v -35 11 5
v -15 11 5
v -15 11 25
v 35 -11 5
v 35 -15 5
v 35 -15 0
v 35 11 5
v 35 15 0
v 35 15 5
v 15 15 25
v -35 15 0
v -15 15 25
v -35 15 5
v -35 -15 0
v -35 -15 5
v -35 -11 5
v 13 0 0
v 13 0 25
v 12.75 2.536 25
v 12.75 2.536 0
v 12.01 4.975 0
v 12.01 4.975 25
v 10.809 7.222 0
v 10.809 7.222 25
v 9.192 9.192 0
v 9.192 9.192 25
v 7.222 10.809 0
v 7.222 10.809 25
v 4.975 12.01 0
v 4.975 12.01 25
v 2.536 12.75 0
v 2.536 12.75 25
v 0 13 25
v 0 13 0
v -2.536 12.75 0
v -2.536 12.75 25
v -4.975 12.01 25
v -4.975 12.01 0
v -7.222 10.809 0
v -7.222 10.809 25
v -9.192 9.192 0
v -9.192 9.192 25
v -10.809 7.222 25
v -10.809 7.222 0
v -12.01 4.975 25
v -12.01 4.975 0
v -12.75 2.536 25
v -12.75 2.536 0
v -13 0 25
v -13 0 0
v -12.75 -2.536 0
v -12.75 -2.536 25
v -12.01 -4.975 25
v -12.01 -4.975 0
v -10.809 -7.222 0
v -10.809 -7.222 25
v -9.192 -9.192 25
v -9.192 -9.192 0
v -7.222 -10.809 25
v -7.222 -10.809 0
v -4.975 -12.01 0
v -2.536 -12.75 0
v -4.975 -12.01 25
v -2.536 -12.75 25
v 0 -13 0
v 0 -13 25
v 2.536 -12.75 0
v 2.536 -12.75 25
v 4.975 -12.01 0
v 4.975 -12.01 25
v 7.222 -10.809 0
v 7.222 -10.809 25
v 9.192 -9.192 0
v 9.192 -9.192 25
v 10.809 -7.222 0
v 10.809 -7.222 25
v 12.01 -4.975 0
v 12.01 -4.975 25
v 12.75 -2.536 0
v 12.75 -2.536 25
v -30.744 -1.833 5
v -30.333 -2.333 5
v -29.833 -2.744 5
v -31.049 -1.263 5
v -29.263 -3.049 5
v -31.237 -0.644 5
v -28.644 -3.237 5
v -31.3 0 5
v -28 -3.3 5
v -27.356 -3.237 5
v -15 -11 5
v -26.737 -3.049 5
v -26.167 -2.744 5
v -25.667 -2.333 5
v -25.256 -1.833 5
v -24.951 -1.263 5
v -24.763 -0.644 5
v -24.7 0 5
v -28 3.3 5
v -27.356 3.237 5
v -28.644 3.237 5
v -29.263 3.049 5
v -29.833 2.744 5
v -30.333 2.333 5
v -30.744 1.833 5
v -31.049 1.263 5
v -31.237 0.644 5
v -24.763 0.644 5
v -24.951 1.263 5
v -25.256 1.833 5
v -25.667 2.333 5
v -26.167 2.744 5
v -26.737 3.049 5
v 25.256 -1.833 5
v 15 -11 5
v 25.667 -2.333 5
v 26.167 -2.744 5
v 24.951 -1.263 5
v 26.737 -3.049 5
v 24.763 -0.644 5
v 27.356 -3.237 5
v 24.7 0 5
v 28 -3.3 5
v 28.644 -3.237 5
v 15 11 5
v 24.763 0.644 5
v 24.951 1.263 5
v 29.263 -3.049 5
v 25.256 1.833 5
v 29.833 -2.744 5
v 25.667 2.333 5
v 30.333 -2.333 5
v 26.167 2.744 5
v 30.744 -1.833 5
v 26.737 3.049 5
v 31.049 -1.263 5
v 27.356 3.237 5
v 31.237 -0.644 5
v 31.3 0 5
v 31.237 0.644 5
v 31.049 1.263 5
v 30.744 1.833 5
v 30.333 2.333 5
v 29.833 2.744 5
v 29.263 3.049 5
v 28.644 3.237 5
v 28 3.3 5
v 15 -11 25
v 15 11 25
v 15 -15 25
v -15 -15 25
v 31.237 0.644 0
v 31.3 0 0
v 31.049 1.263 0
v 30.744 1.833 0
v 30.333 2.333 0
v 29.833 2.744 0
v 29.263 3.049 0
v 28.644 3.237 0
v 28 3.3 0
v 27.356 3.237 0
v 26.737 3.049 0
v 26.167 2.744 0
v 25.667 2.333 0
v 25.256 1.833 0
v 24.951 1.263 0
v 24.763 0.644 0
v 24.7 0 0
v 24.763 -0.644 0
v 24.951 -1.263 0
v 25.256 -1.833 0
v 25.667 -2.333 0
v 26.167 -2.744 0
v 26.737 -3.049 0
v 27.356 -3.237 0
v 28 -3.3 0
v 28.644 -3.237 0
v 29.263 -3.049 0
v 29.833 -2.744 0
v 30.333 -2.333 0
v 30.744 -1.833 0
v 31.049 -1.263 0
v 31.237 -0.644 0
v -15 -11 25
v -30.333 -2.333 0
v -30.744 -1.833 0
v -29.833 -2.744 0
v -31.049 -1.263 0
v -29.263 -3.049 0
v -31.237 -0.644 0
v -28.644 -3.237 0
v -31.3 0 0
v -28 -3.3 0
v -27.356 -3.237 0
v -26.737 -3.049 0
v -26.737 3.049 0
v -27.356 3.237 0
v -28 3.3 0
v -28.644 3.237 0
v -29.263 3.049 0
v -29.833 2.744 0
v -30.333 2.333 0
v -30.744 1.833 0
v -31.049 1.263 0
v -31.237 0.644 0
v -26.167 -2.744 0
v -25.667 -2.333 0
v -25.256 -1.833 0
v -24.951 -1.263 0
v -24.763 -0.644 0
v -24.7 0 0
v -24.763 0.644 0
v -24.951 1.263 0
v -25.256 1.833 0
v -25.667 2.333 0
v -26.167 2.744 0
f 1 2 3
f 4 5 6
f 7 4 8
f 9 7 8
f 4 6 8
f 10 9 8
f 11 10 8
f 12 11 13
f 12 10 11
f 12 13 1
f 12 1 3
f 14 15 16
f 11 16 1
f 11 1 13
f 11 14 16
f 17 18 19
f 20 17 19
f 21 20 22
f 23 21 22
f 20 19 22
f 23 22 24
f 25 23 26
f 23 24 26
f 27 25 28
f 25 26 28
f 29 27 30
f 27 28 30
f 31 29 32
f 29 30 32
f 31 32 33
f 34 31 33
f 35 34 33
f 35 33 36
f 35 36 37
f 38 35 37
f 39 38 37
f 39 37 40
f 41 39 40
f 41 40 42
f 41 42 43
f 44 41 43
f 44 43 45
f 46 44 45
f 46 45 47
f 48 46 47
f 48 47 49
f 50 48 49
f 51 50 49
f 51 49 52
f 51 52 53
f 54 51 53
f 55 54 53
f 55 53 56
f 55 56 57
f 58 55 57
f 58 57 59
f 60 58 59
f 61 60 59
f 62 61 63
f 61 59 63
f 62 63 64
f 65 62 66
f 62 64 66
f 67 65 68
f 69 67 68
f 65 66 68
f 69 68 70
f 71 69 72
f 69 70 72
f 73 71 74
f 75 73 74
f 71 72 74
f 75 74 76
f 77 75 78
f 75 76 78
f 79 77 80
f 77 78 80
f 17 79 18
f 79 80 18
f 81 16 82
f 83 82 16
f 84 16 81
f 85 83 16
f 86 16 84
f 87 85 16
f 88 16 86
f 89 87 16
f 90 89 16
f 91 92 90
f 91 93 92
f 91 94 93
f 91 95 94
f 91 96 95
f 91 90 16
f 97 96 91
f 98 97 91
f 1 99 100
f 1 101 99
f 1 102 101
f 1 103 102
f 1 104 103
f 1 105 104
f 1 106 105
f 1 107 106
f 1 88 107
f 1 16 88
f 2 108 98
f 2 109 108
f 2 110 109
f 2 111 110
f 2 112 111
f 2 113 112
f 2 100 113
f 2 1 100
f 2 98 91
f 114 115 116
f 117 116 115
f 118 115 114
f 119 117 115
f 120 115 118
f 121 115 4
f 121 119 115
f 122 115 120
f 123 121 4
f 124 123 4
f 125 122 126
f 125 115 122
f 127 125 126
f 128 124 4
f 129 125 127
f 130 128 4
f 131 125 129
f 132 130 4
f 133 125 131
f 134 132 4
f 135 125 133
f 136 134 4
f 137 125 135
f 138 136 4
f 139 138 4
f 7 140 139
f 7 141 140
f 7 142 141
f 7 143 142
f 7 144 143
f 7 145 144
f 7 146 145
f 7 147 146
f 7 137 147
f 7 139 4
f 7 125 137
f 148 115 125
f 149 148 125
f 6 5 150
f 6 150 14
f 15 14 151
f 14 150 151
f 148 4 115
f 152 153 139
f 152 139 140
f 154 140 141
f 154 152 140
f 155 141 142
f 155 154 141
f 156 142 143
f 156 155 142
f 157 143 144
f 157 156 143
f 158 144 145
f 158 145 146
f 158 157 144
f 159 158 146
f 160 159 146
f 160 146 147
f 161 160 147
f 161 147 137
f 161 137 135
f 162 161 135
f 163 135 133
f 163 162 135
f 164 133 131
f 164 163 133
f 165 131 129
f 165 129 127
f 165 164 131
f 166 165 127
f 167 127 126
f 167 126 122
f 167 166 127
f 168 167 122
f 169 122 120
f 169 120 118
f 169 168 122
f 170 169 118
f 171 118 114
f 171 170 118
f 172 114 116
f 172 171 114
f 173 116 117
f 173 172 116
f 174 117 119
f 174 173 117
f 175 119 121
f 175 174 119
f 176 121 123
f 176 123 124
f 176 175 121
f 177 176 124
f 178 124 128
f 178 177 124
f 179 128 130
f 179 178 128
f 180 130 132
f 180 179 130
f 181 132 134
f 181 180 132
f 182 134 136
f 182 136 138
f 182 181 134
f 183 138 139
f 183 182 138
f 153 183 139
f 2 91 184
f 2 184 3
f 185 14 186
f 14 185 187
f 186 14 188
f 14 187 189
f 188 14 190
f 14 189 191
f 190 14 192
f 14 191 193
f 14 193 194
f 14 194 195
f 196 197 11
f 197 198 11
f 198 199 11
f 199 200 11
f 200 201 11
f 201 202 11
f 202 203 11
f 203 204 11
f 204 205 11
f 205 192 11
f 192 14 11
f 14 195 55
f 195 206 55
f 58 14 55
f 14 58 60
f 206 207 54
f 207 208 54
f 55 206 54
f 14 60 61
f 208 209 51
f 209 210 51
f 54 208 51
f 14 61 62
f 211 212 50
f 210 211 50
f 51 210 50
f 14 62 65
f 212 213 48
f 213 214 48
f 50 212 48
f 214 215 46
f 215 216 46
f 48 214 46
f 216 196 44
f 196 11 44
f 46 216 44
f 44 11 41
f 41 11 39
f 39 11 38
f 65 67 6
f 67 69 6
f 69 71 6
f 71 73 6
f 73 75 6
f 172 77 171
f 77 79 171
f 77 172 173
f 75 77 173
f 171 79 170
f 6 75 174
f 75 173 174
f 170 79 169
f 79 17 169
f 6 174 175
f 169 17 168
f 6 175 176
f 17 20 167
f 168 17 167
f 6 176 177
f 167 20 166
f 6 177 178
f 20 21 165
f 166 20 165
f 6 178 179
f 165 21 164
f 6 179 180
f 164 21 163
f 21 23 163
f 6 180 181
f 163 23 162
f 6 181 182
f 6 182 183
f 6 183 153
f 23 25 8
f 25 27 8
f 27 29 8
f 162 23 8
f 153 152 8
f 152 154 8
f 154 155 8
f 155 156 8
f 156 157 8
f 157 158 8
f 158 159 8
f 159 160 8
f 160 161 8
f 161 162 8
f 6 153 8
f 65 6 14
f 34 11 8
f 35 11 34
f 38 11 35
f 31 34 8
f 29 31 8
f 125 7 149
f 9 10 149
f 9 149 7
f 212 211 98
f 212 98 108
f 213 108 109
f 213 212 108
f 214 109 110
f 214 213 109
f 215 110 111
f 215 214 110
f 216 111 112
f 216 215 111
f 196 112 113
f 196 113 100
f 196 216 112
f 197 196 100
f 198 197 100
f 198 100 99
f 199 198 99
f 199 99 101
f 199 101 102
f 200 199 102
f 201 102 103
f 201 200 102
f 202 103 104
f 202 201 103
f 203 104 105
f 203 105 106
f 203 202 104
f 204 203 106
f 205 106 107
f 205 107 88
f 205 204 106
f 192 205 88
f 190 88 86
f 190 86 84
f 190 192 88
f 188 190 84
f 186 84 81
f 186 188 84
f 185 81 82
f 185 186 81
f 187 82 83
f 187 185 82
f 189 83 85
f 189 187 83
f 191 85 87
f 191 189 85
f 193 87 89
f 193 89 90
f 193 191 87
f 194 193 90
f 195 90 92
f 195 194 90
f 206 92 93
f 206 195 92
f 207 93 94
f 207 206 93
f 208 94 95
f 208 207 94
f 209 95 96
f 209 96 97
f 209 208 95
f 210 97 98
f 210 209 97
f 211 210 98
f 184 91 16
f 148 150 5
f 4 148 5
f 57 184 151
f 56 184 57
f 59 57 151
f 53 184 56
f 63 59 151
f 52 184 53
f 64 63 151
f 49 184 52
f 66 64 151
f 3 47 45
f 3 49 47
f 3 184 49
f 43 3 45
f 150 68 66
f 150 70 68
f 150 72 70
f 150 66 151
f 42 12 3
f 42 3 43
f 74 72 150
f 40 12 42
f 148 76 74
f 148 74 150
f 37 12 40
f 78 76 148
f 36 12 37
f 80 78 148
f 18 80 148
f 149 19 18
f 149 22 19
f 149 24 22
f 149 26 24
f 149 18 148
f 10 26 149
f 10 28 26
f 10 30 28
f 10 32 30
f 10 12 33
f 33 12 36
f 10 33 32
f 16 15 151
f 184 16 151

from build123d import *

# Parameters (mm, degrees)
SKETCH_1_W          = 70
SKETCH_1_H          = 30
SKETCH_1_R          = 3.3
EXTRUDE_1_DEPTH     = 5
SKETCH_2_W          = 30
SKETCH_2_H          = 30
EXTRUDE_2_DEPTH     = 20
SKETCH_3_R          = 13
CUT_EXTRUDE_1_DEPTH = 26
EXTRUDE_3_DEPTH     = 4


with BuildPart() as part:
    # 草图1 → 凸台-拉伸1 (new body)
    with BuildSketch(Plane.XY):
        Rectangle(SKETCH_1_W, SKETCH_1_H)
        with Locations((-28, 0)):
            Circle(SKETCH_1_R, mode=Mode.SUBTRACT)
        with Locations((28, 0)):
            Circle(SKETCH_1_R, mode=Mode.SUBTRACT)
    extrude(amount=EXTRUDE_1_DEPTH)

    # 草图2 → 凸台-拉伸2 (add)
    with BuildSketch(Plane.XY.offset(5)):
        Rectangle(SKETCH_2_W, SKETCH_2_H)
    extrude(amount=EXTRUDE_2_DEPTH)

    # 草图3 → 切除-拉伸1 (cut, through all)
    with BuildSketch(Plane.XY.offset(25)):
        Circle(SKETCH_3_R)
    extrude(amount=-CUT_EXTRUDE_1_DEPTH, mode=Mode.SUBTRACT)

    # 草图5 → 凸台-拉伸3 (add)
    with BuildSketch(Plane.XZ.offset(15)):
        Polygon((-35, 5), (-15, 25), (-15, 5), align=None)
        Polygon((15, 25), (35, 5), (15, 5), align=None)
    extrude_3 = extrude(amount=-EXTRUDE_3_DEPTH)

    # 镜向1: 凸台-拉伸3 across plane
    add(extrude_3.mirror(Plane.ZX))


solid = part.part
